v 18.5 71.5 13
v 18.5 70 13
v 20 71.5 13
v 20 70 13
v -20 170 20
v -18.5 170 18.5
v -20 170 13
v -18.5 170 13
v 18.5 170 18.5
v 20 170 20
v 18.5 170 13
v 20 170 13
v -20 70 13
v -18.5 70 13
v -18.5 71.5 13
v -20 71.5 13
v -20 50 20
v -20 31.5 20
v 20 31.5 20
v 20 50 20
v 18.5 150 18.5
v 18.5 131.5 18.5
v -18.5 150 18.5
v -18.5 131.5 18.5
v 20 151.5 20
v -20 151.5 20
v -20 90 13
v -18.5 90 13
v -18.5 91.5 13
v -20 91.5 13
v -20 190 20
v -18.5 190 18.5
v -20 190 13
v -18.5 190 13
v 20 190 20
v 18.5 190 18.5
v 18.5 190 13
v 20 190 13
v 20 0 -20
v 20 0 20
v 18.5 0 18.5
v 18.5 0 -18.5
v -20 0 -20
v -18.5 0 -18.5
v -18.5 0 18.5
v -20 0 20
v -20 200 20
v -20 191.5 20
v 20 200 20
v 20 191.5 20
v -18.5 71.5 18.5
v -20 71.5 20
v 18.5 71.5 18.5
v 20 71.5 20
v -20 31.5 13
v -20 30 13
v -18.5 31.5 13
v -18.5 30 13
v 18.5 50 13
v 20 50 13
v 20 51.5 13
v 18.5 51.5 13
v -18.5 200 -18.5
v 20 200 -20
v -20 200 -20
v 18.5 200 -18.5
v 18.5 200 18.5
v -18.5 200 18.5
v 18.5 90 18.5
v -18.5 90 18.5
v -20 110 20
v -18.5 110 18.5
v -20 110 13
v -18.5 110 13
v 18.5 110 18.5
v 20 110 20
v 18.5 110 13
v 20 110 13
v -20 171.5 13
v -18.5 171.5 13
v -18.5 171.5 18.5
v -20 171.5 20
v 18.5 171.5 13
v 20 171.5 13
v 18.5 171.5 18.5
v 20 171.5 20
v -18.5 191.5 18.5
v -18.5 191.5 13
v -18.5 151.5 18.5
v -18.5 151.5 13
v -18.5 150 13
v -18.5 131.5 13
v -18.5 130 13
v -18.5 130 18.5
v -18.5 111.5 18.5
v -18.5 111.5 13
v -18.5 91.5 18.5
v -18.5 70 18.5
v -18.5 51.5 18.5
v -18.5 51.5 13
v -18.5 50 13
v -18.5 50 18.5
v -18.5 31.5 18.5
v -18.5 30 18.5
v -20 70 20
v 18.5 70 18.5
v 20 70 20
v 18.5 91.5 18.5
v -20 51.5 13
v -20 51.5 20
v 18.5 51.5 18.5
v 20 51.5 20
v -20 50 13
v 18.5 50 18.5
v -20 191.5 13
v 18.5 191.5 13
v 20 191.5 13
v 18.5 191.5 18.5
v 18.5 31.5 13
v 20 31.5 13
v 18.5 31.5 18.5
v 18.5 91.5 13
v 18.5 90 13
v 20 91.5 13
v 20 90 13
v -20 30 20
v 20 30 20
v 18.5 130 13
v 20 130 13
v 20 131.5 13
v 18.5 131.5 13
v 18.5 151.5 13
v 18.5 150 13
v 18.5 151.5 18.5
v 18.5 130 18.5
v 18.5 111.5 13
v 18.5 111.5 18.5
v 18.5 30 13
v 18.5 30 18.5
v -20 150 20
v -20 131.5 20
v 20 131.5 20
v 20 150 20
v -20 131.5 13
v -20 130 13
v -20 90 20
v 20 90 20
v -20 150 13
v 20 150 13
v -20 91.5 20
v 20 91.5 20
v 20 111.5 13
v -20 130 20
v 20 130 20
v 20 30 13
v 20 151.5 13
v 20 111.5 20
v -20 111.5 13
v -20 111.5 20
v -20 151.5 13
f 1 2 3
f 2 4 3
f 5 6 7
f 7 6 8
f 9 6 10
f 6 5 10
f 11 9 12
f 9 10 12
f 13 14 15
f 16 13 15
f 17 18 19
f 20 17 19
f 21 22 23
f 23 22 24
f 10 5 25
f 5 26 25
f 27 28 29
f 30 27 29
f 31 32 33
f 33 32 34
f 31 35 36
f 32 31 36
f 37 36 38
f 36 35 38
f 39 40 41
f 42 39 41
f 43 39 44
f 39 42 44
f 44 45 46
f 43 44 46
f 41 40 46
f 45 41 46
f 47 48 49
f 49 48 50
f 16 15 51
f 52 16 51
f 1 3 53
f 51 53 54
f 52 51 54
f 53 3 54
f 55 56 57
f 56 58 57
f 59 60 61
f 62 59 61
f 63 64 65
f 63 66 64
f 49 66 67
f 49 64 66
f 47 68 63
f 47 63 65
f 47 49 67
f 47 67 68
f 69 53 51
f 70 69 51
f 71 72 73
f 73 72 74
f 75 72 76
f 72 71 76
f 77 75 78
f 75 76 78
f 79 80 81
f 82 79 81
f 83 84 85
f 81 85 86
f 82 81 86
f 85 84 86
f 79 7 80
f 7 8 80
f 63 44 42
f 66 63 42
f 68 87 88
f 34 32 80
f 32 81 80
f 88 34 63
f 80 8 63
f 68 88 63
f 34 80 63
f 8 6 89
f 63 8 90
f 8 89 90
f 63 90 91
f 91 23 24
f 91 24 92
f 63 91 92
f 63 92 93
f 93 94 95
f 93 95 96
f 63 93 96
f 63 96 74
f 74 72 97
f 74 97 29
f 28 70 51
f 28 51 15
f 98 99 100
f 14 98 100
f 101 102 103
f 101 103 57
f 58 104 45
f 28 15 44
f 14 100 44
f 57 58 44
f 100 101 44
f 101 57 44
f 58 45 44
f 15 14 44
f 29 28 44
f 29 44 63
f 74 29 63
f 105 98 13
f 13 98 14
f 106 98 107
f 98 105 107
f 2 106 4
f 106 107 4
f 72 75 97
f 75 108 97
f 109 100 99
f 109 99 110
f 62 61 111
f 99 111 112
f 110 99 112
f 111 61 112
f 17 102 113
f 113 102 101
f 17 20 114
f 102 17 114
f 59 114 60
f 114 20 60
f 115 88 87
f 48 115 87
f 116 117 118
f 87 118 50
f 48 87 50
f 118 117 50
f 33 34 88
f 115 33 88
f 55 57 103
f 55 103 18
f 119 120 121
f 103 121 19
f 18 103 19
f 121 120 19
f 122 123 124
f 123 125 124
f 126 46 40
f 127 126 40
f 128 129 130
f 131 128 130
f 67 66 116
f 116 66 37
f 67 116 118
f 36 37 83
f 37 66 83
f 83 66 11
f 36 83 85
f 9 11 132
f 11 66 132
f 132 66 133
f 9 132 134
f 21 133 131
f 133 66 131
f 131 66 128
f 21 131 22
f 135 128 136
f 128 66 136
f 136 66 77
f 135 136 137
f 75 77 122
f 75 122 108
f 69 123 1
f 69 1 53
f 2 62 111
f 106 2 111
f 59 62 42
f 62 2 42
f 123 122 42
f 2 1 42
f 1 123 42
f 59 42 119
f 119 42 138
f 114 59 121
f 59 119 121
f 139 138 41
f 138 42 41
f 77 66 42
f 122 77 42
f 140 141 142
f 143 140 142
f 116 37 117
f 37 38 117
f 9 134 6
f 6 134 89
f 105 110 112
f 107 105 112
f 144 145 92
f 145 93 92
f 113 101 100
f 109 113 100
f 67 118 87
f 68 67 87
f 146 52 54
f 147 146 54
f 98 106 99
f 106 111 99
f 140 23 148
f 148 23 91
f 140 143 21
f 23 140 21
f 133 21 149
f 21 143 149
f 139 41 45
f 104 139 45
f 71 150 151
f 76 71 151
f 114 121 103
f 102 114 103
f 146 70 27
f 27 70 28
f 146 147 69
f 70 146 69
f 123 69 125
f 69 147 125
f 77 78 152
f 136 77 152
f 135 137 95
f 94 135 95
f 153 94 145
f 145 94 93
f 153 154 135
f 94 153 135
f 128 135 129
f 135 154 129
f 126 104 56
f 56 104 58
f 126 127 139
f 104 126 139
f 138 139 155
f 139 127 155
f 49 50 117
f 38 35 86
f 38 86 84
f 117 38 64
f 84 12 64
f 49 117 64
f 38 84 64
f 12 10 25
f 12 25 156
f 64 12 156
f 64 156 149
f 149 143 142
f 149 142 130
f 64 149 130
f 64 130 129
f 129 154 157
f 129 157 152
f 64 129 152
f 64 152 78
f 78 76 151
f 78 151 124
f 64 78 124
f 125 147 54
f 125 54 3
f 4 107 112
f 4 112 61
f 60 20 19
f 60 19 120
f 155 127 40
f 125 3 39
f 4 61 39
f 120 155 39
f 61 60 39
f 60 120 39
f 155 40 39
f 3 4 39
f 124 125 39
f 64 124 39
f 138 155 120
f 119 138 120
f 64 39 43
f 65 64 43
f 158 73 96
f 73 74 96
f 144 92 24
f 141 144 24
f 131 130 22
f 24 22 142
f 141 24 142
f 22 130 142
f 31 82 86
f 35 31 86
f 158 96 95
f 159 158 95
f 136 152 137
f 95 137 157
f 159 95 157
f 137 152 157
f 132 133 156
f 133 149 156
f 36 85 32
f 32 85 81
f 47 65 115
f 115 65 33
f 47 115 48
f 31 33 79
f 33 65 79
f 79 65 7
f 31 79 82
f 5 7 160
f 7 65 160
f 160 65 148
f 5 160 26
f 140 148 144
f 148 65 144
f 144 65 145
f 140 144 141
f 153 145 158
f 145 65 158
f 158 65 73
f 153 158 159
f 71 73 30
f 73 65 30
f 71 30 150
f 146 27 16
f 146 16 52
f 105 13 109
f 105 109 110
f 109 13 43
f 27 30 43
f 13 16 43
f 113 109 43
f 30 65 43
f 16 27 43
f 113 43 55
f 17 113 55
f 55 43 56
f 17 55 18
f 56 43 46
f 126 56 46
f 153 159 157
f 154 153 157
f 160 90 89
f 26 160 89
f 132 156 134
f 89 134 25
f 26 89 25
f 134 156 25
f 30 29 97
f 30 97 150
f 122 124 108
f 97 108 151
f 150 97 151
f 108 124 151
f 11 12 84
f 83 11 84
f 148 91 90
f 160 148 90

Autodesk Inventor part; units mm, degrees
ref_plane "YZ Plane" through (0, 0, 0) normal (1, 0, 0) x (0, 1, 0)
ref_plane "XZ Plane" through (0, 0, 0) normal (0, 1, 0) x (-1, 0, 0)
ref_plane "XY Plane" through (0, 0, 0) normal (0, 0, 1) x (1, 0, 0)
sketch "Sketch1" plane through (0, 0, 0) normal (0, 1, 0) x (-1, 0, 0)
  line L0 (20, 20) -> (-20, 20)
  line L1 (-20, 20) -> (-20, -20)
  line L2 (-20, -20) -> (20, -20)
  line L3 (20, -20) -> (20, 20)
  line L4 (20, 20) -> (-20, -20) construction
  line L5 (-20, 20) -> (20, -20) construction
  line L6 (-18.5, 18.5) -> (18.5, 18.5)
  line L7 (18.5, 18.5) -> (18.5, -18.5)
  line L8 (18.5, -18.5) -> (-18.5, -18.5)
  line L9 (-18.5, -18.5) -> (-18.5, 18.5)
  point P0 (0, 0)
  dimension "d7" = 40
  dimension "d8" = 40
  dimension "d9" = 1.5
extrude "Extrusion1" add sketch "Sketch1" along normal blind 200
sketch "Sketch2" plane through (20, 0, 20) normal (1, 0, 0) x (0, 0, -1)
  line L0 (0, 0) -> (0, 200) projected
  line L1 (0, 30) -> (7, 30)
  line L2 (7, 30) -> (7, 31.5)
  line L3 (7, 31.5) -> (0, 31.5)
  line L4 (0, 31.5) -> (0, 30)
  point P0 (20, 0)
  point P1 (0, 31.5)
  dimension "d10" = 7
  dimension "d11" = 1.5
  dimension "d17" = 30
extrude "Extrusion2" cut sketch "Sketch2" against normal through all
pattern_linear "Rectangular Pattern1" count 49 spacing 20 along (0, 1, 0) of "Extrusion2"
sketch "Sketch5" plane through (0, 0, 0) normal (1, 0, 0) x (0, 1, 0)
  line L0 (0, 20) -> (0, -20) projected
  line L1 (0, 20) -> (30, 20) projected
  line L2 (0, -20) -> (0.007, 20)
  line L3 (200, -20) -> (200, 20) projected
  line L4 (0, -20) -> (200, -20) projected
  line L5 (200, 20) -> (199.993, -20)
  point P0 (0, 0)
  dimension "d18" = 0.01
extrude "Extrusion3" [suppressed]
equation "\"d1\" = BEAM_5_lenth"
equation "\"d18\" = BEAM_5_angle"
equation "\"BEAM_5_lenth\" = 200"
equation "\"BEAM_5_angle\" = 0.01deg"
properties part number "MNT-CDF-315 beam 5"
